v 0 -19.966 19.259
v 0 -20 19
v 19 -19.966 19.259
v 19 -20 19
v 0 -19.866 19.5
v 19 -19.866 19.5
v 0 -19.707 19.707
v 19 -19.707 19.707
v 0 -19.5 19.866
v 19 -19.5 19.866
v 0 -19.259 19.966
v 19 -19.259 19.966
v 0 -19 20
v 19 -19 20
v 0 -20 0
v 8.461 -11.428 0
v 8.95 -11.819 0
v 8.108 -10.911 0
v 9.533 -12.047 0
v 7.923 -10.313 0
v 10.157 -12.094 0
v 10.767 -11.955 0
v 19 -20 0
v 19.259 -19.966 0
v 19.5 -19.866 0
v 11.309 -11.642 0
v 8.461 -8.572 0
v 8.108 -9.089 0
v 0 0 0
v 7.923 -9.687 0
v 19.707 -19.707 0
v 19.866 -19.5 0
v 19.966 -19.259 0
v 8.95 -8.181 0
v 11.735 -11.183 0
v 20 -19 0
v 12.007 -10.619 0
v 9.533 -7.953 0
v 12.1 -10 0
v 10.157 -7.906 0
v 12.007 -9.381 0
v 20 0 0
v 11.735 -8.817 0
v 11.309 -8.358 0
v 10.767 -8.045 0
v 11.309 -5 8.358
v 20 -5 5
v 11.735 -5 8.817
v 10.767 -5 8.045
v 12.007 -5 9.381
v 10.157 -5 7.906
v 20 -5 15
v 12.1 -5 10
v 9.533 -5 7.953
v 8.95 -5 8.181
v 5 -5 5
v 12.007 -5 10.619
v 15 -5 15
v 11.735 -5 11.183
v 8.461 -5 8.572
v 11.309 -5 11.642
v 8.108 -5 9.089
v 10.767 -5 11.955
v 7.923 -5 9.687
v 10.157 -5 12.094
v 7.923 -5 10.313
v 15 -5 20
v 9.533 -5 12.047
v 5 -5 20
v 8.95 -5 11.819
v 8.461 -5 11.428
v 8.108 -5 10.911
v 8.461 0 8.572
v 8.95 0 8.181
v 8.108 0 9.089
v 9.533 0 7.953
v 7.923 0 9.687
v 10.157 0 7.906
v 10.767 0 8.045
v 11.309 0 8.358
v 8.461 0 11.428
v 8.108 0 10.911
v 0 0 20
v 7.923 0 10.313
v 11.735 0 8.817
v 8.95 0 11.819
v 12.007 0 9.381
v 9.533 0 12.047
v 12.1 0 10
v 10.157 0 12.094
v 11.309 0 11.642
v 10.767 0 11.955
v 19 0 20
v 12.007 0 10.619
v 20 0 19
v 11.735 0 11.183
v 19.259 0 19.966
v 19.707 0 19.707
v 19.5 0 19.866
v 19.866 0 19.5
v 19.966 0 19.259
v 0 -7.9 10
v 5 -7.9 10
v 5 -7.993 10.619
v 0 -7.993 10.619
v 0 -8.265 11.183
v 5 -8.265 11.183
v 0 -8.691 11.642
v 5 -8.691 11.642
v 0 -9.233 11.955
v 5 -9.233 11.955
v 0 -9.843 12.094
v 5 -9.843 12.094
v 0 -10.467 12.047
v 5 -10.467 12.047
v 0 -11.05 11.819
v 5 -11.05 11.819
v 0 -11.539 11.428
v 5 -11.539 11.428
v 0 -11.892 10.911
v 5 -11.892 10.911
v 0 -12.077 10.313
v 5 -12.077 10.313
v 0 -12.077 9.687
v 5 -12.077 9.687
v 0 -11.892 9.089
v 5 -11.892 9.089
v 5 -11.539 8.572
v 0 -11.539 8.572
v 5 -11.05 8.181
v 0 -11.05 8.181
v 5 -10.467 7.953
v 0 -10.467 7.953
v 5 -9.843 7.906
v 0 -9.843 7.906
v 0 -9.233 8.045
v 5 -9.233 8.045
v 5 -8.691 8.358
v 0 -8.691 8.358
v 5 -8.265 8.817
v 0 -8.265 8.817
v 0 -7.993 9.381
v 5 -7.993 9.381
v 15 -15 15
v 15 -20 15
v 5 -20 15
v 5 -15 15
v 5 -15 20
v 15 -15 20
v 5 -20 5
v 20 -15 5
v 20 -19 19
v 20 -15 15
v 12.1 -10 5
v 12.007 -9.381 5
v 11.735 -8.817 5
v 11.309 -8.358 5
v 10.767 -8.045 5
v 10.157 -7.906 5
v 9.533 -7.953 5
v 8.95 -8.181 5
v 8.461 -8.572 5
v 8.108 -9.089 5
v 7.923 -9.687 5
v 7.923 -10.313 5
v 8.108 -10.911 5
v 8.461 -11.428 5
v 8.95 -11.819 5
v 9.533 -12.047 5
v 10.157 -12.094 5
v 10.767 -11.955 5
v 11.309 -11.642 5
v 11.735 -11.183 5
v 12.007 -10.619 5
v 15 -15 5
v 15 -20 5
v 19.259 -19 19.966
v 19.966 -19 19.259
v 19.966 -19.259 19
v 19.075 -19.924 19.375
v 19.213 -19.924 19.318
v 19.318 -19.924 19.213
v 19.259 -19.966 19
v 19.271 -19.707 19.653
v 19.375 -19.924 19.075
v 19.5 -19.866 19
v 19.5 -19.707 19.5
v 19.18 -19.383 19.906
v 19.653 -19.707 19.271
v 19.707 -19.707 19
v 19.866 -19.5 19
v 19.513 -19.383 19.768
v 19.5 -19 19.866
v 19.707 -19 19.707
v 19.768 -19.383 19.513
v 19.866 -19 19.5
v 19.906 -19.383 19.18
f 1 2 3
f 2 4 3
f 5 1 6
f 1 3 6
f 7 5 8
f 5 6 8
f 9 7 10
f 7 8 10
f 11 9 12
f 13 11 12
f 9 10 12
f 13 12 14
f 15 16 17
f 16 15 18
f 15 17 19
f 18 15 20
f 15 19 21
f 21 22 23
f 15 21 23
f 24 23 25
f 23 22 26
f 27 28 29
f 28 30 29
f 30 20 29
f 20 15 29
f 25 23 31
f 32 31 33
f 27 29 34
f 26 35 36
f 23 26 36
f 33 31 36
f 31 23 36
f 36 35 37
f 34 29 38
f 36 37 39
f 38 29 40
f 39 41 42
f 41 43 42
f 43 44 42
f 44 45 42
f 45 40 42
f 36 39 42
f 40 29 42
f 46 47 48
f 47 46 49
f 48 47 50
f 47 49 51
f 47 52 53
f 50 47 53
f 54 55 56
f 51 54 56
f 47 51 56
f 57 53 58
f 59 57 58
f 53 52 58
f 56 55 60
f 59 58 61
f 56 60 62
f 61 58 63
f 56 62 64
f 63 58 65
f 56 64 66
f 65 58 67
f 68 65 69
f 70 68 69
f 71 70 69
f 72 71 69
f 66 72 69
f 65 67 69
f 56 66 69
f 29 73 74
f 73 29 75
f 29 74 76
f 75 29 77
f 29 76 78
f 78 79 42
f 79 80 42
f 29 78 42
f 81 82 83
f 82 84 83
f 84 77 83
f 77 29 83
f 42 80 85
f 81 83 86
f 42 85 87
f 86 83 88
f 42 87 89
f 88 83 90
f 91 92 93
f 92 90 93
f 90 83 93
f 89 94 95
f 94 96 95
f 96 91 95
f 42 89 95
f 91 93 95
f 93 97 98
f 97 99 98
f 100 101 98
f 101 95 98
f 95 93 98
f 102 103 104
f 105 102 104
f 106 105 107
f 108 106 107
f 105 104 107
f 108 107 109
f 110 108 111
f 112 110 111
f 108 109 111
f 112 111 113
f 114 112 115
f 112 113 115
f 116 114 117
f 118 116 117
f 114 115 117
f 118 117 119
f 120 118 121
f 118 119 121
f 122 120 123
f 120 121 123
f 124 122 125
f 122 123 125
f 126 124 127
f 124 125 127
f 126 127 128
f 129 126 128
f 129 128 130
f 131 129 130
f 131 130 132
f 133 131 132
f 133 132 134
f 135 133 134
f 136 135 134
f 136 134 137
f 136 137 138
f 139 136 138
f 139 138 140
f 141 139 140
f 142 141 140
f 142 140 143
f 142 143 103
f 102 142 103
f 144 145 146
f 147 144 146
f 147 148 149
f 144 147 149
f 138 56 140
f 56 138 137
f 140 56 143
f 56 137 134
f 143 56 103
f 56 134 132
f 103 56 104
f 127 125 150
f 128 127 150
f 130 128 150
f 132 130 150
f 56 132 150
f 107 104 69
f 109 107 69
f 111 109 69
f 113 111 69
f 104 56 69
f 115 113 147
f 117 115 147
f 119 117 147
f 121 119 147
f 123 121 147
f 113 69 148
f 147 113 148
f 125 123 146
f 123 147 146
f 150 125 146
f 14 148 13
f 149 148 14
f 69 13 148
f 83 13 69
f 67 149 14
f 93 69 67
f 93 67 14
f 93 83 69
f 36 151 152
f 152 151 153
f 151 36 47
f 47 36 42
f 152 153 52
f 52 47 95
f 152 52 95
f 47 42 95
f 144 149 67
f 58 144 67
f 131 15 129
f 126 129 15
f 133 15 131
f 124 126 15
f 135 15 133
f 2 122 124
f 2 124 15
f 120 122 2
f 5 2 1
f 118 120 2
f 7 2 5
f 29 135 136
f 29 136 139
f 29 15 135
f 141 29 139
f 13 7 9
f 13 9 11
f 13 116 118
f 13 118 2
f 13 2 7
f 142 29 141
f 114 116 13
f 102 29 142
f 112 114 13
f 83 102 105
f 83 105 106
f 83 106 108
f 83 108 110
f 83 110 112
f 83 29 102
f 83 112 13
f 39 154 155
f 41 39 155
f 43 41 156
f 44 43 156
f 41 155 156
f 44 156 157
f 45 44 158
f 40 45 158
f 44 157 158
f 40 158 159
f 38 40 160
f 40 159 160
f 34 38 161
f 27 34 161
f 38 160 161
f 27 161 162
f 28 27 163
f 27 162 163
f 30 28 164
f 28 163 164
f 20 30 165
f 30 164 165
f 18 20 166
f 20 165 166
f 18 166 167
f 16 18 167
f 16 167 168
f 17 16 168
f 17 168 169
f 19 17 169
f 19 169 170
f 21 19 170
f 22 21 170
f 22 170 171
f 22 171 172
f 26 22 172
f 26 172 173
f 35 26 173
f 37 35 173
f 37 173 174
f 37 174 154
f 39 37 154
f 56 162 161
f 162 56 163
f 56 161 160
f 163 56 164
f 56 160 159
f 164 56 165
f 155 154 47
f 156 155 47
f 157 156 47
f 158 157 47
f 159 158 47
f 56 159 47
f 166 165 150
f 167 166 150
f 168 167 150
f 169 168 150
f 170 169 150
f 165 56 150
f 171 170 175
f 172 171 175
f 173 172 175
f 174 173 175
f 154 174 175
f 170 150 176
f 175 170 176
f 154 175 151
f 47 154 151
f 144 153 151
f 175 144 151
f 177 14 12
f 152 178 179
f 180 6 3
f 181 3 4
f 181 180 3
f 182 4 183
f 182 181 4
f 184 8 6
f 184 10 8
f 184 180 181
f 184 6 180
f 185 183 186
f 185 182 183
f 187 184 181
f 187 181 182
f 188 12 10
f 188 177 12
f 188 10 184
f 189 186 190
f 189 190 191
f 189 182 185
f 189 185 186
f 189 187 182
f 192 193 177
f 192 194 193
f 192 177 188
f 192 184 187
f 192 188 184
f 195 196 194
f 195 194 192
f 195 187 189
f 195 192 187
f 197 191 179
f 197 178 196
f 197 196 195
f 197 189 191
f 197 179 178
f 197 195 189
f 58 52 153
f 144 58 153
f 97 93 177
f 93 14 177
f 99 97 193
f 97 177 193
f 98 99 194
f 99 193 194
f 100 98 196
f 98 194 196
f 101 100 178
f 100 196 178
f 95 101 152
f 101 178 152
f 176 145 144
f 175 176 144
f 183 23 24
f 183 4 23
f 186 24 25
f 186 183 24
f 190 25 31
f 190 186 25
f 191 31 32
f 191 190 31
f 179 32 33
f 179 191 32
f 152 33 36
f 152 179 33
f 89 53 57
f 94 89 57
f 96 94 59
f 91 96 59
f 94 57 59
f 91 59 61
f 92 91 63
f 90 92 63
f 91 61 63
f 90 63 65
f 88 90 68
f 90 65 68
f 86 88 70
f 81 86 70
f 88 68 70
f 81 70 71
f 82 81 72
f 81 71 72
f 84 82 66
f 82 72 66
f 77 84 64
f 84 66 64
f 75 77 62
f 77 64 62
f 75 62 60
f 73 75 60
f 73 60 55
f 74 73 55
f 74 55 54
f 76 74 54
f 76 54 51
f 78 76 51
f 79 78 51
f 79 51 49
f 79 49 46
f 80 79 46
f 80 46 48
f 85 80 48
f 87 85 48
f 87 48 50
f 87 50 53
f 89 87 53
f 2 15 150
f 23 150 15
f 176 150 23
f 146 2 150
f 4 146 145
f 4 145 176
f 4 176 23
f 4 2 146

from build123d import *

# Parameters (mm, degrees)
F0_W      = 20
F0_H      = 20
F1_DEPTH  = 20
F2_W      = 5
F2_H      = 5
F3_DEPTH  = 15
F4_R      = 2.1
F5_DEPTH  = 25
F6_W      = 5
F6_H      = 5
F7_DEPTH  = 15
F8_R      = 2.1
F9_DEPTH  = 25
F10_W     = 5
F10_H     = 5
F11_DEPTH = 15
F12_R     = 2.1
F13_DEPTH = 25
F14_R     = 1


with BuildPart() as f1:
    # F0 (on Front) → F1 (new body)
    with BuildSketch(Plane.XZ):
        with Locations((10, 10)):
            Rectangle(F0_W, F0_H)
    extrude(amount=F1_DEPTH)

    # F2 (on face) → F3 (cut)
    with BuildSketch(Plane.XZ.offset(20)):
        with Locations((7.5, 12.5)):
            Rectangle(F2_W, F2_H)
        with Locations((12.5, 12.5)):
            Rectangle(F2_W, F2_H)
        with Locations((12.5, 7.5)):
            Rectangle(F2_W, F2_H)
        with Locations((7.5, 7.5)):
            Rectangle(F2_W, F2_H)
    extrude(amount=-F3_DEPTH, mode=Mode.SUBTRACT)

    # F4 (on face) → F5 (cut)
    with BuildSketch(Plane.XZ.offset(5)):
        with Locations((10, 10)):
            Circle(F4_R)
    extrude(amount=-F5_DEPTH, mode=Mode.SUBTRACT)

    # F6 (on face) → F7 (cut)
    with BuildSketch(Plane.XY.offset(20)):
        with Locations((7.5, -7.5)):
            Rectangle(F6_W, F6_H)
        with Locations((12.5, -7.5)):
            Rectangle(F6_W, F6_H)
        with Locations((12.5, -12.5)):
            Rectangle(F6_W, F6_H)
        with Locations((7.5, -12.5)):
            Rectangle(F6_W, F6_H)
    extrude(amount=-F7_DEPTH, mode=Mode.SUBTRACT)

    # F8 (on face) → F9 (cut)
    with BuildSketch(Plane.XY.offset(5)):
        with Locations((10, -10)):
            Circle(F8_R)
    extrude(amount=-F9_DEPTH, mode=Mode.SUBTRACT)

    # F10 (on face) → F11 (cut)
    with BuildSketch(Plane.YZ.offset(20)):
        with Locations((-12.5, 12.5)):
            Rectangle(F10_W, F10_H)
        with Locations((-7.5, 12.5)):
            Rectangle(F10_W, F10_H)
        with Locations((-7.5, 7.5)):
            Rectangle(F10_W, F10_H)
        with Locations((-12.5, 7.5)):
            Rectangle(F10_W, F10_H)
    extrude(amount=-F11_DEPTH, mode=Mode.SUBTRACT)

    # F12 (on face) → F13 (cut)
    with BuildSketch(Plane.YZ.offset(5)):
        with Locations((-10, 10)):
            Circle(F12_R)
    extrude(amount=-F13_DEPTH, mode=Mode.SUBTRACT)

    # F14
    f14_edges = [f1.edges().sort_by_distance(p)[0] for p in [
        (20, -10, 20),
        (10, -20, 20),
        (20, -20, 10),
    ]]
    fillet(f14_edges, radius=F14_R)


solid = f1.part
